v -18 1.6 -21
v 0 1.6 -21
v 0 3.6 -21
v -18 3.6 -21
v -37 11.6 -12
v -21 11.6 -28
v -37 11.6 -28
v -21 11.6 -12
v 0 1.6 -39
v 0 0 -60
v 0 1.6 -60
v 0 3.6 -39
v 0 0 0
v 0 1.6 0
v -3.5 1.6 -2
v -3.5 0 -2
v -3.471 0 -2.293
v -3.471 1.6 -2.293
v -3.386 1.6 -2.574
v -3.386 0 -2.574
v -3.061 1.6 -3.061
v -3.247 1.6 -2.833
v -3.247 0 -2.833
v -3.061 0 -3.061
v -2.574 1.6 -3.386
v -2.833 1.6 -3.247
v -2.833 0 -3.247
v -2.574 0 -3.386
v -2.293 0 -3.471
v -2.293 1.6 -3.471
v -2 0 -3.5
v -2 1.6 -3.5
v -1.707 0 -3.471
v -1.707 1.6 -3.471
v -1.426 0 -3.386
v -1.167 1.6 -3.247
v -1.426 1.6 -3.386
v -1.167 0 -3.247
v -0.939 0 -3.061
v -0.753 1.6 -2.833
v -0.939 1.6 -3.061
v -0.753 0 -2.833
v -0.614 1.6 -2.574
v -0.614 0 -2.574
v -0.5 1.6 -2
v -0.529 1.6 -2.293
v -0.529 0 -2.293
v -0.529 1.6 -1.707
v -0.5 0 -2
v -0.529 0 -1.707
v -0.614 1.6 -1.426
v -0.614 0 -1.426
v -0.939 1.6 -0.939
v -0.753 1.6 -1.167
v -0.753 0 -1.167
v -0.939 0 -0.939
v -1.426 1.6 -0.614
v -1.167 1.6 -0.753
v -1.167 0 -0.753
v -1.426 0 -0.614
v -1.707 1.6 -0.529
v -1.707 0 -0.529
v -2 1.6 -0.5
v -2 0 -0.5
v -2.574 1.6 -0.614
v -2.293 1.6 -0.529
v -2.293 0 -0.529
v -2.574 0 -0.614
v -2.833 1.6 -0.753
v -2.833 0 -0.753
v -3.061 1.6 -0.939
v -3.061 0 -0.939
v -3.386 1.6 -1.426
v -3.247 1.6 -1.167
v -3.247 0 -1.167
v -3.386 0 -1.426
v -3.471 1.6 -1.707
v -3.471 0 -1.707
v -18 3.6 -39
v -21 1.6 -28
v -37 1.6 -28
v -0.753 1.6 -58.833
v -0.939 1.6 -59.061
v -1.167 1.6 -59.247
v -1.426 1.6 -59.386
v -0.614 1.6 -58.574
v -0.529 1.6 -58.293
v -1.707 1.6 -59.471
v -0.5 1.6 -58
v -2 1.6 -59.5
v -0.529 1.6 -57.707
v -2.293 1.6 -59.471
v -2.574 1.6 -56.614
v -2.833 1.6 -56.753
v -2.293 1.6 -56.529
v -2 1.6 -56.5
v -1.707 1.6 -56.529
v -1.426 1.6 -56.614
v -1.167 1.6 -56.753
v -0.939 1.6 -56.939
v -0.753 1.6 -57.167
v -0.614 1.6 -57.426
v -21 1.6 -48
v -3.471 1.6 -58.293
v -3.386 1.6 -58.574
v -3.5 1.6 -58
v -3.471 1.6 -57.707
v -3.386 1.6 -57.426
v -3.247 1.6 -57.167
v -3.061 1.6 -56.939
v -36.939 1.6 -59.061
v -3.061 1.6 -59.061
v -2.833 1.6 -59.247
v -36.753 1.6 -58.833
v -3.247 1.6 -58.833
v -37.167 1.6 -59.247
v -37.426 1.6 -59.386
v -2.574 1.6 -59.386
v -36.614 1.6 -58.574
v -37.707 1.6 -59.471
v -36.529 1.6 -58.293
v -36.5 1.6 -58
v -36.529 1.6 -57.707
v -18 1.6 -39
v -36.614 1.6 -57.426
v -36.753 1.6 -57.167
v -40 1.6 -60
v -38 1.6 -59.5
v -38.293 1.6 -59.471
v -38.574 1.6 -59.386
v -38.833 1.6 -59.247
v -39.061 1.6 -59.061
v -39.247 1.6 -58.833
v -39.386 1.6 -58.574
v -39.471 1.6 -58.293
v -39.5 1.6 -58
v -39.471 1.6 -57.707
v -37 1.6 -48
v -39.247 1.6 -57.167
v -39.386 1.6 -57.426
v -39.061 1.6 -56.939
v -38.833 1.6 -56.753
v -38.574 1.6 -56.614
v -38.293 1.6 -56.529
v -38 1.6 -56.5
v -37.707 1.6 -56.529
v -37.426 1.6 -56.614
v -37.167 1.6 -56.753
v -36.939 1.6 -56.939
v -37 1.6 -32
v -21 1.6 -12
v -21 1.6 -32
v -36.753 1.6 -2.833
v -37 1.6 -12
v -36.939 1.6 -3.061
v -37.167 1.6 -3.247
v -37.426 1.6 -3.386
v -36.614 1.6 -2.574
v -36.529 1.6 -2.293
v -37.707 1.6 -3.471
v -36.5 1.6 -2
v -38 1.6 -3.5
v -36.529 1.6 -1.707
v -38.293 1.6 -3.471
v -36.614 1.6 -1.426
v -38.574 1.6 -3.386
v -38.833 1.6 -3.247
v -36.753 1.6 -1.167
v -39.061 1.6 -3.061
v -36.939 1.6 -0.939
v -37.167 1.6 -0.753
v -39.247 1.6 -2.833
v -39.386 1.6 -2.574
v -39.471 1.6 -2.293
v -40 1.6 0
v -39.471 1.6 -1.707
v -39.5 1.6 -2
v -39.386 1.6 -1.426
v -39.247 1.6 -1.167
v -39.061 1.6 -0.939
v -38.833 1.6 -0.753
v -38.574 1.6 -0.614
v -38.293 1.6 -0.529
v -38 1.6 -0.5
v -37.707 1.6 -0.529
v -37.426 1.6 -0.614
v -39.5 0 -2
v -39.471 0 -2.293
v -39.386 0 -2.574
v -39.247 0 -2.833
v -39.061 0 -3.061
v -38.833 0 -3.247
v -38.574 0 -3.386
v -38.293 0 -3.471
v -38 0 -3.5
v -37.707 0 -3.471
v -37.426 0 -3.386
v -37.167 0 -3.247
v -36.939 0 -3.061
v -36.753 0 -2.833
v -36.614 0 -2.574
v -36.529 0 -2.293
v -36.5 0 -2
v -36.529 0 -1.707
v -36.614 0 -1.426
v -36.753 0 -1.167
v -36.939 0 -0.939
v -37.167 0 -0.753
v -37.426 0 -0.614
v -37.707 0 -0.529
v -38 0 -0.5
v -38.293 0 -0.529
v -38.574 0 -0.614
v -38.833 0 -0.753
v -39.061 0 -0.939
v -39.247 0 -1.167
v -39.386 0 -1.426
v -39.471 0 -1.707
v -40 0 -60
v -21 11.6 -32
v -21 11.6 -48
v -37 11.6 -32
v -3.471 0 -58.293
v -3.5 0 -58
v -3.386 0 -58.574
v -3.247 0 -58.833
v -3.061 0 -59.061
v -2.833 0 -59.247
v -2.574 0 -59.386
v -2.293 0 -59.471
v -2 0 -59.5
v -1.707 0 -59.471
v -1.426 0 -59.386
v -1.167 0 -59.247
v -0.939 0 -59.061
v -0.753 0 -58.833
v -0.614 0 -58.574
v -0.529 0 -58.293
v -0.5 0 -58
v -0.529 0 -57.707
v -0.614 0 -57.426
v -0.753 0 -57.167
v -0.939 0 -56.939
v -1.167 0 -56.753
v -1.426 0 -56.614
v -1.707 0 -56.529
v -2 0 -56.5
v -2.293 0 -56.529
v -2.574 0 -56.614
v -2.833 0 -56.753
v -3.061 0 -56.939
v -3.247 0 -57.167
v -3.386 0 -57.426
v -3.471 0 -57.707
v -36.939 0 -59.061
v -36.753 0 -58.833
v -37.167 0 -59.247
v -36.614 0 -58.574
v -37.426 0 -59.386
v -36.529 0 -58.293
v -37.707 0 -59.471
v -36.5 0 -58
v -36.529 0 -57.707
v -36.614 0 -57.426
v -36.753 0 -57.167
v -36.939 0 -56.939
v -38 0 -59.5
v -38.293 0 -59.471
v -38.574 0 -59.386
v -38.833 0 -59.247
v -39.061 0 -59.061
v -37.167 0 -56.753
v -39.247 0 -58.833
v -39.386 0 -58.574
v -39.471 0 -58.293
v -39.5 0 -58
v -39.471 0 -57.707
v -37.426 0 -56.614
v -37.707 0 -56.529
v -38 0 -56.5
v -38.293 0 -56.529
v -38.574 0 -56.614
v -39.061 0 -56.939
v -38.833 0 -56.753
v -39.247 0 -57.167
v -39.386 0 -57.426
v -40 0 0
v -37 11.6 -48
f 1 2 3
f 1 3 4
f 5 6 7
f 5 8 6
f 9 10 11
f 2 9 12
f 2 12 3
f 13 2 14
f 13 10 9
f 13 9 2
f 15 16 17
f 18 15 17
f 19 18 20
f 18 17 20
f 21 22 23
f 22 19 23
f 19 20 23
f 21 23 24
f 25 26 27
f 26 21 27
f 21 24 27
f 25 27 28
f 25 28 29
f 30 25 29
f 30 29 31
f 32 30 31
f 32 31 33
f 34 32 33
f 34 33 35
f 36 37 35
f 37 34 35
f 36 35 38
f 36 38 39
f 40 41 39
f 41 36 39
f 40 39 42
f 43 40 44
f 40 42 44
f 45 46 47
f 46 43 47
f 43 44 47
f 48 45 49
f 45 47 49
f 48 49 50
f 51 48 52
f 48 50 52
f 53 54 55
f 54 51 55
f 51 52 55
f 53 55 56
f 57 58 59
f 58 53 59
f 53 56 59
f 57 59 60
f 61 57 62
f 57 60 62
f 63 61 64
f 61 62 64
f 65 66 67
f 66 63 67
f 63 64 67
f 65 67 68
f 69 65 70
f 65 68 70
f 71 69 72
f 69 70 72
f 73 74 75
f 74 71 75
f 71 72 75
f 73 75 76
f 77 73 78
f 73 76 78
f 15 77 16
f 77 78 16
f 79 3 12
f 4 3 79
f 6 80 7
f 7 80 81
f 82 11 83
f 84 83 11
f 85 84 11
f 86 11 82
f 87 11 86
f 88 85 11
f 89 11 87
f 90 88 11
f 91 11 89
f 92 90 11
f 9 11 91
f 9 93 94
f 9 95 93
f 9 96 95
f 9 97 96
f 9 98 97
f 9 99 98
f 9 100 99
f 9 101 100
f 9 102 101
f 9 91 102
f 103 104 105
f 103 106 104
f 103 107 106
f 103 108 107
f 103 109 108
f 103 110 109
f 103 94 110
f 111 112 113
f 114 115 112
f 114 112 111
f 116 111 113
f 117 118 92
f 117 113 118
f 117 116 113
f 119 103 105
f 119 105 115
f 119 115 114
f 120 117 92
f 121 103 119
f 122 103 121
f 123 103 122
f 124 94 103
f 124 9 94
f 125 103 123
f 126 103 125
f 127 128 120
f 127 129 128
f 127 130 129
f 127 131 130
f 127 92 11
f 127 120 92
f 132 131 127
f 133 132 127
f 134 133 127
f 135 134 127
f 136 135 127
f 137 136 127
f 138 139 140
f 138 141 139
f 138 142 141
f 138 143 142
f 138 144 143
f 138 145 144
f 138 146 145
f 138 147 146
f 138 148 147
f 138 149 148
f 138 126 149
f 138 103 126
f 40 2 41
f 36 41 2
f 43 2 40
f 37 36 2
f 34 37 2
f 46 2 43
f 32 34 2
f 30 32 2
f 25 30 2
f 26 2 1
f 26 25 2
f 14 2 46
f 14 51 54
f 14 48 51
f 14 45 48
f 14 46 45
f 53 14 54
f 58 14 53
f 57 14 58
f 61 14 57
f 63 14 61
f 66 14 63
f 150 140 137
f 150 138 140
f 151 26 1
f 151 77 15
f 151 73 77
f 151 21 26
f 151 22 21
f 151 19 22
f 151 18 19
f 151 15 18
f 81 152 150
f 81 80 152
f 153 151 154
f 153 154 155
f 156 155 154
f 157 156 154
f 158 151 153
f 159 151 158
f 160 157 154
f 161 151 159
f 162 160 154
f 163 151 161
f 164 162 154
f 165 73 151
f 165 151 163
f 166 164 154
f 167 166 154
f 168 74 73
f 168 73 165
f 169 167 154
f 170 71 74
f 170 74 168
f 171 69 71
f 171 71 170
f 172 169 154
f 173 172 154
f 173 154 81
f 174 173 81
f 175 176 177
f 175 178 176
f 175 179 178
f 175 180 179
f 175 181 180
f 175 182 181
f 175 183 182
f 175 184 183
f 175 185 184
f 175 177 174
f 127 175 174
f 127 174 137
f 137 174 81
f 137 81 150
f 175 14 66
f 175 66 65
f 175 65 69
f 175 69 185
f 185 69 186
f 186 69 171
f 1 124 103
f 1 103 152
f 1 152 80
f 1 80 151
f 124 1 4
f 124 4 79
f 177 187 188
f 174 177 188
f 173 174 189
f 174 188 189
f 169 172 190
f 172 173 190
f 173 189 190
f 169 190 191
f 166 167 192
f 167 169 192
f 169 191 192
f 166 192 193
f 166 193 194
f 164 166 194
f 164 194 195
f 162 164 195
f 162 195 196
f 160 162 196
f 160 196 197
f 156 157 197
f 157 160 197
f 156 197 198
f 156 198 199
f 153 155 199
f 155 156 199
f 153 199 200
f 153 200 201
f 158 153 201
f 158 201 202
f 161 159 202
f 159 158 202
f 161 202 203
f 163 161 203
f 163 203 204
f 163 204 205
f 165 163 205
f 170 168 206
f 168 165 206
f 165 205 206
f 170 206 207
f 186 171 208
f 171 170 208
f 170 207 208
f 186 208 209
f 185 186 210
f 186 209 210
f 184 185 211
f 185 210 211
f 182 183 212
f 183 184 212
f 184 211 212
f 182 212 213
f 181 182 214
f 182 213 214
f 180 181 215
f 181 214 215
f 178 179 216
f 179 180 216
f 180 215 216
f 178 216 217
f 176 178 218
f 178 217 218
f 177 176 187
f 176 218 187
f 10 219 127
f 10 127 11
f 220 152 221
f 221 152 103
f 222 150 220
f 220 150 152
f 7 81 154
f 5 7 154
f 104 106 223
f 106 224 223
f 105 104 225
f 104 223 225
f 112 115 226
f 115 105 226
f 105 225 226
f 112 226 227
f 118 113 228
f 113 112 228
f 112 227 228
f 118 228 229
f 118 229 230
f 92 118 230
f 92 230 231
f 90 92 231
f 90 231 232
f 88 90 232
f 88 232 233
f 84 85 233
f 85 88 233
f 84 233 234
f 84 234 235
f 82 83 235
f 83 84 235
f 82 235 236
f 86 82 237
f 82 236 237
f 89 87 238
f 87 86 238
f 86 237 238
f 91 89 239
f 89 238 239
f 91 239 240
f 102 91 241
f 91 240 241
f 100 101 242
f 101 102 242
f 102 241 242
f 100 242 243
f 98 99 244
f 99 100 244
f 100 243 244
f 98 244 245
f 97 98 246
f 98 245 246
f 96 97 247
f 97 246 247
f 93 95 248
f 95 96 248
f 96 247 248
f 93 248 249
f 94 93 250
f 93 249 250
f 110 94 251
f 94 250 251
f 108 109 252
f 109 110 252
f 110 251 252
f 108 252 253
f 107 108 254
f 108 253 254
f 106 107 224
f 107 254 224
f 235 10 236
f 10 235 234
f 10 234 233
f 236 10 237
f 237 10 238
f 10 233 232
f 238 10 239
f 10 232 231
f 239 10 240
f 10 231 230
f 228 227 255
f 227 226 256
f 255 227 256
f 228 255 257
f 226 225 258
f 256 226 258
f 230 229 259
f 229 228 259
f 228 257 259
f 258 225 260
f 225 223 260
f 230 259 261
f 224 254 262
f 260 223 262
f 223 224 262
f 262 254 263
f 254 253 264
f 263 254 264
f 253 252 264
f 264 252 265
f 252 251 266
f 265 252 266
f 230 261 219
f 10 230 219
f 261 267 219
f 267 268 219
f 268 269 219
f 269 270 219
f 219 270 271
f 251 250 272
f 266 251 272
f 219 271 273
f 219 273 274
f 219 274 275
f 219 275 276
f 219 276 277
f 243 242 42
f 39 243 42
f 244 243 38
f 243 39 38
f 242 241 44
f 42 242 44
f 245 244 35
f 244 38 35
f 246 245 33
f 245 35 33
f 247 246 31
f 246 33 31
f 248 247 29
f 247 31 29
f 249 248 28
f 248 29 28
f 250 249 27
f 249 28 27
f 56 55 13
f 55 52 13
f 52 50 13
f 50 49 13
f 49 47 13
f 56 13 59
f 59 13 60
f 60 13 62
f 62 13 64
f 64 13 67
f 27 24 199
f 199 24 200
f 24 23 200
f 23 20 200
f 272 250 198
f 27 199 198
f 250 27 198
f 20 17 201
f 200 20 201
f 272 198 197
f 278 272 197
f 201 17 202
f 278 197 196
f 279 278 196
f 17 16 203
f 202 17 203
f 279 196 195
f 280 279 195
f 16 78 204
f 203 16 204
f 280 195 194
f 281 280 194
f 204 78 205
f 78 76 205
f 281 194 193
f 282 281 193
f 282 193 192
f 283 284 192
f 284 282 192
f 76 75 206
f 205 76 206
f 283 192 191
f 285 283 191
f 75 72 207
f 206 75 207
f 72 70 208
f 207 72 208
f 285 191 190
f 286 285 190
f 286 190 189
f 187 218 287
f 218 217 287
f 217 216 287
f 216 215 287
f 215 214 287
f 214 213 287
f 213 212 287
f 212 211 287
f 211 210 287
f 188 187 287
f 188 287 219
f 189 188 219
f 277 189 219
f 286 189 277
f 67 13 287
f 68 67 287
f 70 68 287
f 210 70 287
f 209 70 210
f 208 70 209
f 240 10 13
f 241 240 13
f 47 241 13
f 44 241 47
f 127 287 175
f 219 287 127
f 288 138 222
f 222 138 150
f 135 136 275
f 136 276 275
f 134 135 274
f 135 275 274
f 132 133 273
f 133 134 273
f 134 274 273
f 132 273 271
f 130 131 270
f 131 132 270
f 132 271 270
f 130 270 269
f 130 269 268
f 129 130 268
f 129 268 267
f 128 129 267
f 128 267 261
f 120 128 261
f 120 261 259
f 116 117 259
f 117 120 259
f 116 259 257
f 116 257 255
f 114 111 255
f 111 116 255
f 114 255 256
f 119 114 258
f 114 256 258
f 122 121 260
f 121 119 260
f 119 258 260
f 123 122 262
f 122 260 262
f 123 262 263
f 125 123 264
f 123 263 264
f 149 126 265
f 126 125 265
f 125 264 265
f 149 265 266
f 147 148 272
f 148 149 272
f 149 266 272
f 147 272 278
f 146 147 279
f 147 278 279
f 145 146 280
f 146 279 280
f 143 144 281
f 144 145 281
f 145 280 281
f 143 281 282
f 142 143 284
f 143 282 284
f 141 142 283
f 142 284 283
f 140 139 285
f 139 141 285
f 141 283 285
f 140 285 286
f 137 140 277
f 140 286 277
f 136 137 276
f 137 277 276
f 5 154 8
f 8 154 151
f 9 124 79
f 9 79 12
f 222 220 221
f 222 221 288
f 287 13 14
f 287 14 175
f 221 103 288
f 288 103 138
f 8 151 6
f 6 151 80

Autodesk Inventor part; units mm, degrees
ref_plane "YZ Plane" through (0, 0, 0) normal (1, 0, 0) x (0, 1, 0)
ref_plane "XZ Plane" through (0, 0, 0) normal (0, 1, 0) x (-1, 0, 0)
ref_plane "XY Plane" through (0, 0, 0) normal (0, 0, 1) x (1, 0, 0)
sketch "Эскиз1" plane through (0, 0, 0) normal (0, 1, 0) x (-1, 0, 0)
  line L0 (0, 0) -> (40, 0)
  line L1 (40, 0) -> (40, -60)
  line L2 (40, -60) -> (0, -60)
  line L3 (0, -60) -> (0, 0)
  line L4 (37, -12) -> (21, -12)
  line L5 (21, -12) -> (21, -28)
  line L6 (21, -28) -> (37, -28)
  line L7 (37, -28) -> (37, -12)
  line L8 (37, -32) -> (21, -32)
  line L9 (21, -32) -> (21, -48)
  line L10 (21, -48) -> (37, -48)
  line L11 (37, -48) -> (37, -32)
  line L12 (0, -21) -> (18, -21)
  line L13 (18, -21) -> (18, -39)
  line L14 (18, -39) -> (0, -39)
  line L15 (0, -39) -> (0, -21)
  circle A0 centre (2, -2) radius 1.5
  circle A1 centre (2, -58) radius 1.5
  circle A2 centre (38, -2) radius 1.5
  circle A3 centre (38, -58) radius 1.5
  point P0 (0, -39)
  dimension "d0" = 40
  dimension "d1" = 60
  dimension "d2" = 16
  dimension "d3" = 16
  dimension "d4" = 3
  dimension "d5" = 12
  dimension "d6" = 16
  dimension "d7" = 16
  dimension "d8" = 4
  dimension "d9" = 3
  dimension "d10" = 18
  dimension "d11" = 18
  dimension "d12" = 21
  dimension "d13" = 3
  dimension "d14" = 2
  dimension "d15" = 2
  dimension "d18" = 56
  dimension "d21" = 36
extrude "Выдавливание1" add sketch "Эскиз1" along normal blind 1.6 contours L0 L1 L2 L3 L14 L13 L12
extrude "Выдавливание2" add sketch "Эскиз1" along normal blind 11.6 contours L7 L6 L5 L4 | L11 L10 L9 L8
extrude "Выдавливание3" add sketch "Эскиз1" along normal blind 3.6 contours L12 L13 L14 L3
properties part number "plate"
